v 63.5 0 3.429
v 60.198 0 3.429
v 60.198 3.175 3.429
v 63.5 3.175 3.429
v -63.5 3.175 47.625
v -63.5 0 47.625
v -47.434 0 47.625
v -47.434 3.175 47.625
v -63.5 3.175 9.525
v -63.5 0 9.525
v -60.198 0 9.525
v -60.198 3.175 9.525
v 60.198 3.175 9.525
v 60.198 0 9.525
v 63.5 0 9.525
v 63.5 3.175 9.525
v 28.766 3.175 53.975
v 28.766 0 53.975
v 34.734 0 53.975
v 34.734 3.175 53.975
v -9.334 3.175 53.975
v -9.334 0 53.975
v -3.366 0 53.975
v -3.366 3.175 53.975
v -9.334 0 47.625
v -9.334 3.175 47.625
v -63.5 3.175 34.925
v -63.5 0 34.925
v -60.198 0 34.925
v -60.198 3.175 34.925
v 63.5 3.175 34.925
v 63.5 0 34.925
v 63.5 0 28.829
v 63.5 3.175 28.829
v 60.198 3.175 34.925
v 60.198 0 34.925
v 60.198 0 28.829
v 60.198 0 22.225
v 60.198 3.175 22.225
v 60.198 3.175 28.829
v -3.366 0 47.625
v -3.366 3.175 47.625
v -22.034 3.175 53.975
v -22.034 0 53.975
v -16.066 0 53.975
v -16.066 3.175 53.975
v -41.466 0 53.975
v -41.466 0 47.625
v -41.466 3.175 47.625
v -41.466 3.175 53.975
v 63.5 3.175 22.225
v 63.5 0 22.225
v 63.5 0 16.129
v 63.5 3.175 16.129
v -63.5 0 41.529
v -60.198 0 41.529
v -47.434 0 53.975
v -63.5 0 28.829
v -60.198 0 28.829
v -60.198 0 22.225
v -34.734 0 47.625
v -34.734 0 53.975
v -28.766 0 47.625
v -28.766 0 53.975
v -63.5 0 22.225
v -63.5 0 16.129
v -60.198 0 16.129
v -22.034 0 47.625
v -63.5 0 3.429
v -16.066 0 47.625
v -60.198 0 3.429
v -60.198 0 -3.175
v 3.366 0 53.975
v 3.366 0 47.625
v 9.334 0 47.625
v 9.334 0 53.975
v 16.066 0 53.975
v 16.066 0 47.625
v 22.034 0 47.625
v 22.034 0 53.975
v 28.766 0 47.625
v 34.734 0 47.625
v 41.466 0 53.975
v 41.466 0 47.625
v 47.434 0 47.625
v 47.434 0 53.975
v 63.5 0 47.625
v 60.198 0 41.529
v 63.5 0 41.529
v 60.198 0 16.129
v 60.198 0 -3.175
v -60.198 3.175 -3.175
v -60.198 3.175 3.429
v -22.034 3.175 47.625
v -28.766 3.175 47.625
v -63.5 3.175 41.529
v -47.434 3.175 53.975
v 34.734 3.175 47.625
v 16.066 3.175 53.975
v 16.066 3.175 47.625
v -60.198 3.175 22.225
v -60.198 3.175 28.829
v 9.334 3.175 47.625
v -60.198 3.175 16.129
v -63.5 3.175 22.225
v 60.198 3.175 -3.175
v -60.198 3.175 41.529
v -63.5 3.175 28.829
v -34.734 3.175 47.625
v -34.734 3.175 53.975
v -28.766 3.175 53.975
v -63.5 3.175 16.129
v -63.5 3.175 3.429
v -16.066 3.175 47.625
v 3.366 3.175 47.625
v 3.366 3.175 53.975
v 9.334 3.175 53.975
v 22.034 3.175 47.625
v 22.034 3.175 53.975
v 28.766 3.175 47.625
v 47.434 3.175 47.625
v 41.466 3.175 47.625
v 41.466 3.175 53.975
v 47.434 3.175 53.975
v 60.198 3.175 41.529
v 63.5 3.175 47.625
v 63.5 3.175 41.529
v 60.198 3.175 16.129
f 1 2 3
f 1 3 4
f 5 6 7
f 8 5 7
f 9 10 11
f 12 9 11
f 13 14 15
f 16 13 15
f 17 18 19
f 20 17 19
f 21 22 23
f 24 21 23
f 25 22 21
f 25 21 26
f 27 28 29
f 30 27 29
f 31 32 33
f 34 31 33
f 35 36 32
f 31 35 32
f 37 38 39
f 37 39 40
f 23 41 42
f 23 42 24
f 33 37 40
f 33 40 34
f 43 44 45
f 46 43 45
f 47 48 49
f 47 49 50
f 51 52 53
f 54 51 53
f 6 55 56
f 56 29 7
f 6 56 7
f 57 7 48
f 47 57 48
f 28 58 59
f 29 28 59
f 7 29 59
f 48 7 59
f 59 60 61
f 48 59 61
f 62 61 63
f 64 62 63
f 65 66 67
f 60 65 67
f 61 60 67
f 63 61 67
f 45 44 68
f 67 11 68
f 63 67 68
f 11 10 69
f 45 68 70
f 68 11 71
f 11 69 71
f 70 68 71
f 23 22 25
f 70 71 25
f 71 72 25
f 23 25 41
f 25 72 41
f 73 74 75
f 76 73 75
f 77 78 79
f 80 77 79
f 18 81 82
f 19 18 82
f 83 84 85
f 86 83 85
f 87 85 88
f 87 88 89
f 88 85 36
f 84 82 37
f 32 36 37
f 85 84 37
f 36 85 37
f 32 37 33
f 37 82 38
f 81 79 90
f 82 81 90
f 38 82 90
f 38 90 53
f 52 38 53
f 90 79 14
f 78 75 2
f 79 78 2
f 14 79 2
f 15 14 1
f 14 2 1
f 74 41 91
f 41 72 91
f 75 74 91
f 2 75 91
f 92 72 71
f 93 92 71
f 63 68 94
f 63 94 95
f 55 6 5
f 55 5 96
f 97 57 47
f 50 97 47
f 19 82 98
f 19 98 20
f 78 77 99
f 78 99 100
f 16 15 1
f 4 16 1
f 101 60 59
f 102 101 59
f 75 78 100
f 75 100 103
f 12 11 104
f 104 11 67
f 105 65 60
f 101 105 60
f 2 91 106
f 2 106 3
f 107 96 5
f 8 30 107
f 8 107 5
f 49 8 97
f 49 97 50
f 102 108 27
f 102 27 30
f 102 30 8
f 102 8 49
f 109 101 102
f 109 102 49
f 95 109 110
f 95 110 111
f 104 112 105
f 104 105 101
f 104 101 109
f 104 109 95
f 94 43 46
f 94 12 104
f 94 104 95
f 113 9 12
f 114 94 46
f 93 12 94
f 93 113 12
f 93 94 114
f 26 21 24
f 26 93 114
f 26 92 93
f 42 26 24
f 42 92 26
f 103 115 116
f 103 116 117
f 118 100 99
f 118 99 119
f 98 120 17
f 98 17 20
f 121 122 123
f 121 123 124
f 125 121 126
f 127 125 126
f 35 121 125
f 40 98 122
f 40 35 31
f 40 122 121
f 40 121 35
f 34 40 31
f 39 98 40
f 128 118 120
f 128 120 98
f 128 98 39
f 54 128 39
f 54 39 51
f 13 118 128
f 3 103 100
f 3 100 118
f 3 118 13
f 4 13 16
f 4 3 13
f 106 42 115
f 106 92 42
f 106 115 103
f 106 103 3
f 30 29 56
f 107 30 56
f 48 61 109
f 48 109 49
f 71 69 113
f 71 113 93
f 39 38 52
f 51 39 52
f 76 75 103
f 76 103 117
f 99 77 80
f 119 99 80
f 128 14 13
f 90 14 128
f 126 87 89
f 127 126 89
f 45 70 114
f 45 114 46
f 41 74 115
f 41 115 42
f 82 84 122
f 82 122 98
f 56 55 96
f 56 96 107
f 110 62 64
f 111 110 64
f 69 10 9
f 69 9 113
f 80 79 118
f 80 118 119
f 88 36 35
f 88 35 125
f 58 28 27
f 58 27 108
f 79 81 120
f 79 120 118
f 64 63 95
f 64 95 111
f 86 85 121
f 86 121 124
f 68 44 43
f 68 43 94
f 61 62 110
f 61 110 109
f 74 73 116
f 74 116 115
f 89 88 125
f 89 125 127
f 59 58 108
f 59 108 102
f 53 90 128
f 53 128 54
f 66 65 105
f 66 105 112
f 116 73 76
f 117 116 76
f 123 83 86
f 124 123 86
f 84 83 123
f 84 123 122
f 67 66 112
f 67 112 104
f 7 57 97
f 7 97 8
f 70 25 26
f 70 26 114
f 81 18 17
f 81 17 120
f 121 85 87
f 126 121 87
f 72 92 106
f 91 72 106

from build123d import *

# Parameters (mm, degrees)
SKETCH1_W           = 127
SKETCH1_H           = 107.95
BOSS_EXTRUDE1_DEPTH = 3.175
SKETCH2_W           = 3.302
SKETCH2_H           = 6.604
CUT_EXTRUDE1_DEPTH  = 84.400427157
SKETCH3_W           = 127
SKETCH3_H           = 50.8
CUT_EXTRUDE2_DEPTH  = 84.400427157


with BuildPart() as part:
    # Sketch1 → Boss-Extrude1 (new body)
    with BuildSketch(Plane(origin=(0, 0, 0), x_dir=(1, 0, 0), z_dir=(0, 1, 0))):
        Rectangle(SKETCH1_W, SKETCH1_H)
    extrude(amount=BOSS_EXTRUDE1_DEPTH)

    # Sketch2 → Cut-Extrude1 (cut, through all)
    with BuildSketch(Plane.XZ):
        Polygon((-34.7345, 47.625), (-41.4655, 47.625), (-41.4655, 54.229), (-47.4345, 54.229), (-47.4345, 47.625), (-60.198, 47.625), (-63.5, 47.625), (-63.5, 54.229), (-63.5, 63.03162391), (63.5, 63.03162391), (63.5, 54.229), (63.5, 47.625), (60.198, 47.625), (47.4345, 47.625), (47.4345, 54.229), (41.4655, 54.229), (41.4655, 47.625), (34.7345, 47.625), (34.7345, 54.229), (28.7655, 54.229), (28.7655, 47.625), (22.0345, 47.625), (22.0345, 54.229), (16.0655, 54.229), (16.0655, 47.625), (9.3345, 47.625), (9.3345, 54.229), (3.3655, 54.229), (3.3655, 47.625), (-3.3655, 47.625), (-3.3655, 54.229), (-9.3345, 54.229), (-9.3345, 47.625), (-16.0655, 47.625), (-16.0655, 54.229), (-22.0345, 54.229), (-22.0345, 47.625), (-28.7655, 47.625), (-28.7655, 54.229), (-34.7345, 54.229), align=None)
        with Locations((61.849, 38.227)):
            Rectangle(SKETCH2_W, SKETCH2_H)
        with Locations((61.849, 25.527)):
            Rectangle(SKETCH2_W, SKETCH2_H)
        with Locations((61.849, 12.827)):
            Rectangle(SKETCH2_W, SKETCH2_H)
        with Locations((61.849, 0.127)):
            Rectangle(SKETCH2_W, SKETCH2_H)
        with Locations((61.849, -12.573)):
            Rectangle(SKETCH2_W, SKETCH2_H)
        with Locations((61.849, -25.273)):
            Rectangle(SKETCH2_W, SKETCH2_H)
        with Locations((61.849, -37.973)):
            Rectangle(SKETCH2_W, SKETCH2_H)
        with Locations((-61.849, -37.973)):
            Rectangle(SKETCH2_W, SKETCH2_H)
        with Locations((-61.849, -25.273)):
            Rectangle(SKETCH2_W, SKETCH2_H)
        with Locations((-61.849, -12.573)):
            Rectangle(SKETCH2_W, SKETCH2_H)
        with Locations((-61.849, 0.127)):
            Rectangle(SKETCH2_W, SKETCH2_H)
        with Locations((-61.849, 12.827)):
            Rectangle(SKETCH2_W, SKETCH2_H)
        with Locations((-61.849, 25.527)):
            Rectangle(SKETCH2_W, SKETCH2_H)
        with Locations((-61.849, 38.227)):
            Rectangle(SKETCH2_W, SKETCH2_H)
        with Locations((61.849, -50.673)):
            Rectangle(SKETCH2_W, SKETCH2_H)
        with Locations((-61.849, -50.673)):
            Rectangle(SKETCH2_W, SKETCH2_H)
    extrude(amount=-CUT_EXTRUDE1_DEPTH, mode=Mode.SUBTRACT)

    # Sketch3 → Cut-Extrude2 (cut, through all)
    with BuildSketch(Plane(origin=(0, 3.175, 0), x_dir=(1, 0, 0), z_dir=(0, 1, 0))):
        with Locations((0, 28.575)):
            Rectangle(SKETCH3_W, SKETCH3_H)
    extrude(amount=-CUT_EXTRUDE2_DEPTH, mode=Mode.SUBTRACT)


solid = part.part
